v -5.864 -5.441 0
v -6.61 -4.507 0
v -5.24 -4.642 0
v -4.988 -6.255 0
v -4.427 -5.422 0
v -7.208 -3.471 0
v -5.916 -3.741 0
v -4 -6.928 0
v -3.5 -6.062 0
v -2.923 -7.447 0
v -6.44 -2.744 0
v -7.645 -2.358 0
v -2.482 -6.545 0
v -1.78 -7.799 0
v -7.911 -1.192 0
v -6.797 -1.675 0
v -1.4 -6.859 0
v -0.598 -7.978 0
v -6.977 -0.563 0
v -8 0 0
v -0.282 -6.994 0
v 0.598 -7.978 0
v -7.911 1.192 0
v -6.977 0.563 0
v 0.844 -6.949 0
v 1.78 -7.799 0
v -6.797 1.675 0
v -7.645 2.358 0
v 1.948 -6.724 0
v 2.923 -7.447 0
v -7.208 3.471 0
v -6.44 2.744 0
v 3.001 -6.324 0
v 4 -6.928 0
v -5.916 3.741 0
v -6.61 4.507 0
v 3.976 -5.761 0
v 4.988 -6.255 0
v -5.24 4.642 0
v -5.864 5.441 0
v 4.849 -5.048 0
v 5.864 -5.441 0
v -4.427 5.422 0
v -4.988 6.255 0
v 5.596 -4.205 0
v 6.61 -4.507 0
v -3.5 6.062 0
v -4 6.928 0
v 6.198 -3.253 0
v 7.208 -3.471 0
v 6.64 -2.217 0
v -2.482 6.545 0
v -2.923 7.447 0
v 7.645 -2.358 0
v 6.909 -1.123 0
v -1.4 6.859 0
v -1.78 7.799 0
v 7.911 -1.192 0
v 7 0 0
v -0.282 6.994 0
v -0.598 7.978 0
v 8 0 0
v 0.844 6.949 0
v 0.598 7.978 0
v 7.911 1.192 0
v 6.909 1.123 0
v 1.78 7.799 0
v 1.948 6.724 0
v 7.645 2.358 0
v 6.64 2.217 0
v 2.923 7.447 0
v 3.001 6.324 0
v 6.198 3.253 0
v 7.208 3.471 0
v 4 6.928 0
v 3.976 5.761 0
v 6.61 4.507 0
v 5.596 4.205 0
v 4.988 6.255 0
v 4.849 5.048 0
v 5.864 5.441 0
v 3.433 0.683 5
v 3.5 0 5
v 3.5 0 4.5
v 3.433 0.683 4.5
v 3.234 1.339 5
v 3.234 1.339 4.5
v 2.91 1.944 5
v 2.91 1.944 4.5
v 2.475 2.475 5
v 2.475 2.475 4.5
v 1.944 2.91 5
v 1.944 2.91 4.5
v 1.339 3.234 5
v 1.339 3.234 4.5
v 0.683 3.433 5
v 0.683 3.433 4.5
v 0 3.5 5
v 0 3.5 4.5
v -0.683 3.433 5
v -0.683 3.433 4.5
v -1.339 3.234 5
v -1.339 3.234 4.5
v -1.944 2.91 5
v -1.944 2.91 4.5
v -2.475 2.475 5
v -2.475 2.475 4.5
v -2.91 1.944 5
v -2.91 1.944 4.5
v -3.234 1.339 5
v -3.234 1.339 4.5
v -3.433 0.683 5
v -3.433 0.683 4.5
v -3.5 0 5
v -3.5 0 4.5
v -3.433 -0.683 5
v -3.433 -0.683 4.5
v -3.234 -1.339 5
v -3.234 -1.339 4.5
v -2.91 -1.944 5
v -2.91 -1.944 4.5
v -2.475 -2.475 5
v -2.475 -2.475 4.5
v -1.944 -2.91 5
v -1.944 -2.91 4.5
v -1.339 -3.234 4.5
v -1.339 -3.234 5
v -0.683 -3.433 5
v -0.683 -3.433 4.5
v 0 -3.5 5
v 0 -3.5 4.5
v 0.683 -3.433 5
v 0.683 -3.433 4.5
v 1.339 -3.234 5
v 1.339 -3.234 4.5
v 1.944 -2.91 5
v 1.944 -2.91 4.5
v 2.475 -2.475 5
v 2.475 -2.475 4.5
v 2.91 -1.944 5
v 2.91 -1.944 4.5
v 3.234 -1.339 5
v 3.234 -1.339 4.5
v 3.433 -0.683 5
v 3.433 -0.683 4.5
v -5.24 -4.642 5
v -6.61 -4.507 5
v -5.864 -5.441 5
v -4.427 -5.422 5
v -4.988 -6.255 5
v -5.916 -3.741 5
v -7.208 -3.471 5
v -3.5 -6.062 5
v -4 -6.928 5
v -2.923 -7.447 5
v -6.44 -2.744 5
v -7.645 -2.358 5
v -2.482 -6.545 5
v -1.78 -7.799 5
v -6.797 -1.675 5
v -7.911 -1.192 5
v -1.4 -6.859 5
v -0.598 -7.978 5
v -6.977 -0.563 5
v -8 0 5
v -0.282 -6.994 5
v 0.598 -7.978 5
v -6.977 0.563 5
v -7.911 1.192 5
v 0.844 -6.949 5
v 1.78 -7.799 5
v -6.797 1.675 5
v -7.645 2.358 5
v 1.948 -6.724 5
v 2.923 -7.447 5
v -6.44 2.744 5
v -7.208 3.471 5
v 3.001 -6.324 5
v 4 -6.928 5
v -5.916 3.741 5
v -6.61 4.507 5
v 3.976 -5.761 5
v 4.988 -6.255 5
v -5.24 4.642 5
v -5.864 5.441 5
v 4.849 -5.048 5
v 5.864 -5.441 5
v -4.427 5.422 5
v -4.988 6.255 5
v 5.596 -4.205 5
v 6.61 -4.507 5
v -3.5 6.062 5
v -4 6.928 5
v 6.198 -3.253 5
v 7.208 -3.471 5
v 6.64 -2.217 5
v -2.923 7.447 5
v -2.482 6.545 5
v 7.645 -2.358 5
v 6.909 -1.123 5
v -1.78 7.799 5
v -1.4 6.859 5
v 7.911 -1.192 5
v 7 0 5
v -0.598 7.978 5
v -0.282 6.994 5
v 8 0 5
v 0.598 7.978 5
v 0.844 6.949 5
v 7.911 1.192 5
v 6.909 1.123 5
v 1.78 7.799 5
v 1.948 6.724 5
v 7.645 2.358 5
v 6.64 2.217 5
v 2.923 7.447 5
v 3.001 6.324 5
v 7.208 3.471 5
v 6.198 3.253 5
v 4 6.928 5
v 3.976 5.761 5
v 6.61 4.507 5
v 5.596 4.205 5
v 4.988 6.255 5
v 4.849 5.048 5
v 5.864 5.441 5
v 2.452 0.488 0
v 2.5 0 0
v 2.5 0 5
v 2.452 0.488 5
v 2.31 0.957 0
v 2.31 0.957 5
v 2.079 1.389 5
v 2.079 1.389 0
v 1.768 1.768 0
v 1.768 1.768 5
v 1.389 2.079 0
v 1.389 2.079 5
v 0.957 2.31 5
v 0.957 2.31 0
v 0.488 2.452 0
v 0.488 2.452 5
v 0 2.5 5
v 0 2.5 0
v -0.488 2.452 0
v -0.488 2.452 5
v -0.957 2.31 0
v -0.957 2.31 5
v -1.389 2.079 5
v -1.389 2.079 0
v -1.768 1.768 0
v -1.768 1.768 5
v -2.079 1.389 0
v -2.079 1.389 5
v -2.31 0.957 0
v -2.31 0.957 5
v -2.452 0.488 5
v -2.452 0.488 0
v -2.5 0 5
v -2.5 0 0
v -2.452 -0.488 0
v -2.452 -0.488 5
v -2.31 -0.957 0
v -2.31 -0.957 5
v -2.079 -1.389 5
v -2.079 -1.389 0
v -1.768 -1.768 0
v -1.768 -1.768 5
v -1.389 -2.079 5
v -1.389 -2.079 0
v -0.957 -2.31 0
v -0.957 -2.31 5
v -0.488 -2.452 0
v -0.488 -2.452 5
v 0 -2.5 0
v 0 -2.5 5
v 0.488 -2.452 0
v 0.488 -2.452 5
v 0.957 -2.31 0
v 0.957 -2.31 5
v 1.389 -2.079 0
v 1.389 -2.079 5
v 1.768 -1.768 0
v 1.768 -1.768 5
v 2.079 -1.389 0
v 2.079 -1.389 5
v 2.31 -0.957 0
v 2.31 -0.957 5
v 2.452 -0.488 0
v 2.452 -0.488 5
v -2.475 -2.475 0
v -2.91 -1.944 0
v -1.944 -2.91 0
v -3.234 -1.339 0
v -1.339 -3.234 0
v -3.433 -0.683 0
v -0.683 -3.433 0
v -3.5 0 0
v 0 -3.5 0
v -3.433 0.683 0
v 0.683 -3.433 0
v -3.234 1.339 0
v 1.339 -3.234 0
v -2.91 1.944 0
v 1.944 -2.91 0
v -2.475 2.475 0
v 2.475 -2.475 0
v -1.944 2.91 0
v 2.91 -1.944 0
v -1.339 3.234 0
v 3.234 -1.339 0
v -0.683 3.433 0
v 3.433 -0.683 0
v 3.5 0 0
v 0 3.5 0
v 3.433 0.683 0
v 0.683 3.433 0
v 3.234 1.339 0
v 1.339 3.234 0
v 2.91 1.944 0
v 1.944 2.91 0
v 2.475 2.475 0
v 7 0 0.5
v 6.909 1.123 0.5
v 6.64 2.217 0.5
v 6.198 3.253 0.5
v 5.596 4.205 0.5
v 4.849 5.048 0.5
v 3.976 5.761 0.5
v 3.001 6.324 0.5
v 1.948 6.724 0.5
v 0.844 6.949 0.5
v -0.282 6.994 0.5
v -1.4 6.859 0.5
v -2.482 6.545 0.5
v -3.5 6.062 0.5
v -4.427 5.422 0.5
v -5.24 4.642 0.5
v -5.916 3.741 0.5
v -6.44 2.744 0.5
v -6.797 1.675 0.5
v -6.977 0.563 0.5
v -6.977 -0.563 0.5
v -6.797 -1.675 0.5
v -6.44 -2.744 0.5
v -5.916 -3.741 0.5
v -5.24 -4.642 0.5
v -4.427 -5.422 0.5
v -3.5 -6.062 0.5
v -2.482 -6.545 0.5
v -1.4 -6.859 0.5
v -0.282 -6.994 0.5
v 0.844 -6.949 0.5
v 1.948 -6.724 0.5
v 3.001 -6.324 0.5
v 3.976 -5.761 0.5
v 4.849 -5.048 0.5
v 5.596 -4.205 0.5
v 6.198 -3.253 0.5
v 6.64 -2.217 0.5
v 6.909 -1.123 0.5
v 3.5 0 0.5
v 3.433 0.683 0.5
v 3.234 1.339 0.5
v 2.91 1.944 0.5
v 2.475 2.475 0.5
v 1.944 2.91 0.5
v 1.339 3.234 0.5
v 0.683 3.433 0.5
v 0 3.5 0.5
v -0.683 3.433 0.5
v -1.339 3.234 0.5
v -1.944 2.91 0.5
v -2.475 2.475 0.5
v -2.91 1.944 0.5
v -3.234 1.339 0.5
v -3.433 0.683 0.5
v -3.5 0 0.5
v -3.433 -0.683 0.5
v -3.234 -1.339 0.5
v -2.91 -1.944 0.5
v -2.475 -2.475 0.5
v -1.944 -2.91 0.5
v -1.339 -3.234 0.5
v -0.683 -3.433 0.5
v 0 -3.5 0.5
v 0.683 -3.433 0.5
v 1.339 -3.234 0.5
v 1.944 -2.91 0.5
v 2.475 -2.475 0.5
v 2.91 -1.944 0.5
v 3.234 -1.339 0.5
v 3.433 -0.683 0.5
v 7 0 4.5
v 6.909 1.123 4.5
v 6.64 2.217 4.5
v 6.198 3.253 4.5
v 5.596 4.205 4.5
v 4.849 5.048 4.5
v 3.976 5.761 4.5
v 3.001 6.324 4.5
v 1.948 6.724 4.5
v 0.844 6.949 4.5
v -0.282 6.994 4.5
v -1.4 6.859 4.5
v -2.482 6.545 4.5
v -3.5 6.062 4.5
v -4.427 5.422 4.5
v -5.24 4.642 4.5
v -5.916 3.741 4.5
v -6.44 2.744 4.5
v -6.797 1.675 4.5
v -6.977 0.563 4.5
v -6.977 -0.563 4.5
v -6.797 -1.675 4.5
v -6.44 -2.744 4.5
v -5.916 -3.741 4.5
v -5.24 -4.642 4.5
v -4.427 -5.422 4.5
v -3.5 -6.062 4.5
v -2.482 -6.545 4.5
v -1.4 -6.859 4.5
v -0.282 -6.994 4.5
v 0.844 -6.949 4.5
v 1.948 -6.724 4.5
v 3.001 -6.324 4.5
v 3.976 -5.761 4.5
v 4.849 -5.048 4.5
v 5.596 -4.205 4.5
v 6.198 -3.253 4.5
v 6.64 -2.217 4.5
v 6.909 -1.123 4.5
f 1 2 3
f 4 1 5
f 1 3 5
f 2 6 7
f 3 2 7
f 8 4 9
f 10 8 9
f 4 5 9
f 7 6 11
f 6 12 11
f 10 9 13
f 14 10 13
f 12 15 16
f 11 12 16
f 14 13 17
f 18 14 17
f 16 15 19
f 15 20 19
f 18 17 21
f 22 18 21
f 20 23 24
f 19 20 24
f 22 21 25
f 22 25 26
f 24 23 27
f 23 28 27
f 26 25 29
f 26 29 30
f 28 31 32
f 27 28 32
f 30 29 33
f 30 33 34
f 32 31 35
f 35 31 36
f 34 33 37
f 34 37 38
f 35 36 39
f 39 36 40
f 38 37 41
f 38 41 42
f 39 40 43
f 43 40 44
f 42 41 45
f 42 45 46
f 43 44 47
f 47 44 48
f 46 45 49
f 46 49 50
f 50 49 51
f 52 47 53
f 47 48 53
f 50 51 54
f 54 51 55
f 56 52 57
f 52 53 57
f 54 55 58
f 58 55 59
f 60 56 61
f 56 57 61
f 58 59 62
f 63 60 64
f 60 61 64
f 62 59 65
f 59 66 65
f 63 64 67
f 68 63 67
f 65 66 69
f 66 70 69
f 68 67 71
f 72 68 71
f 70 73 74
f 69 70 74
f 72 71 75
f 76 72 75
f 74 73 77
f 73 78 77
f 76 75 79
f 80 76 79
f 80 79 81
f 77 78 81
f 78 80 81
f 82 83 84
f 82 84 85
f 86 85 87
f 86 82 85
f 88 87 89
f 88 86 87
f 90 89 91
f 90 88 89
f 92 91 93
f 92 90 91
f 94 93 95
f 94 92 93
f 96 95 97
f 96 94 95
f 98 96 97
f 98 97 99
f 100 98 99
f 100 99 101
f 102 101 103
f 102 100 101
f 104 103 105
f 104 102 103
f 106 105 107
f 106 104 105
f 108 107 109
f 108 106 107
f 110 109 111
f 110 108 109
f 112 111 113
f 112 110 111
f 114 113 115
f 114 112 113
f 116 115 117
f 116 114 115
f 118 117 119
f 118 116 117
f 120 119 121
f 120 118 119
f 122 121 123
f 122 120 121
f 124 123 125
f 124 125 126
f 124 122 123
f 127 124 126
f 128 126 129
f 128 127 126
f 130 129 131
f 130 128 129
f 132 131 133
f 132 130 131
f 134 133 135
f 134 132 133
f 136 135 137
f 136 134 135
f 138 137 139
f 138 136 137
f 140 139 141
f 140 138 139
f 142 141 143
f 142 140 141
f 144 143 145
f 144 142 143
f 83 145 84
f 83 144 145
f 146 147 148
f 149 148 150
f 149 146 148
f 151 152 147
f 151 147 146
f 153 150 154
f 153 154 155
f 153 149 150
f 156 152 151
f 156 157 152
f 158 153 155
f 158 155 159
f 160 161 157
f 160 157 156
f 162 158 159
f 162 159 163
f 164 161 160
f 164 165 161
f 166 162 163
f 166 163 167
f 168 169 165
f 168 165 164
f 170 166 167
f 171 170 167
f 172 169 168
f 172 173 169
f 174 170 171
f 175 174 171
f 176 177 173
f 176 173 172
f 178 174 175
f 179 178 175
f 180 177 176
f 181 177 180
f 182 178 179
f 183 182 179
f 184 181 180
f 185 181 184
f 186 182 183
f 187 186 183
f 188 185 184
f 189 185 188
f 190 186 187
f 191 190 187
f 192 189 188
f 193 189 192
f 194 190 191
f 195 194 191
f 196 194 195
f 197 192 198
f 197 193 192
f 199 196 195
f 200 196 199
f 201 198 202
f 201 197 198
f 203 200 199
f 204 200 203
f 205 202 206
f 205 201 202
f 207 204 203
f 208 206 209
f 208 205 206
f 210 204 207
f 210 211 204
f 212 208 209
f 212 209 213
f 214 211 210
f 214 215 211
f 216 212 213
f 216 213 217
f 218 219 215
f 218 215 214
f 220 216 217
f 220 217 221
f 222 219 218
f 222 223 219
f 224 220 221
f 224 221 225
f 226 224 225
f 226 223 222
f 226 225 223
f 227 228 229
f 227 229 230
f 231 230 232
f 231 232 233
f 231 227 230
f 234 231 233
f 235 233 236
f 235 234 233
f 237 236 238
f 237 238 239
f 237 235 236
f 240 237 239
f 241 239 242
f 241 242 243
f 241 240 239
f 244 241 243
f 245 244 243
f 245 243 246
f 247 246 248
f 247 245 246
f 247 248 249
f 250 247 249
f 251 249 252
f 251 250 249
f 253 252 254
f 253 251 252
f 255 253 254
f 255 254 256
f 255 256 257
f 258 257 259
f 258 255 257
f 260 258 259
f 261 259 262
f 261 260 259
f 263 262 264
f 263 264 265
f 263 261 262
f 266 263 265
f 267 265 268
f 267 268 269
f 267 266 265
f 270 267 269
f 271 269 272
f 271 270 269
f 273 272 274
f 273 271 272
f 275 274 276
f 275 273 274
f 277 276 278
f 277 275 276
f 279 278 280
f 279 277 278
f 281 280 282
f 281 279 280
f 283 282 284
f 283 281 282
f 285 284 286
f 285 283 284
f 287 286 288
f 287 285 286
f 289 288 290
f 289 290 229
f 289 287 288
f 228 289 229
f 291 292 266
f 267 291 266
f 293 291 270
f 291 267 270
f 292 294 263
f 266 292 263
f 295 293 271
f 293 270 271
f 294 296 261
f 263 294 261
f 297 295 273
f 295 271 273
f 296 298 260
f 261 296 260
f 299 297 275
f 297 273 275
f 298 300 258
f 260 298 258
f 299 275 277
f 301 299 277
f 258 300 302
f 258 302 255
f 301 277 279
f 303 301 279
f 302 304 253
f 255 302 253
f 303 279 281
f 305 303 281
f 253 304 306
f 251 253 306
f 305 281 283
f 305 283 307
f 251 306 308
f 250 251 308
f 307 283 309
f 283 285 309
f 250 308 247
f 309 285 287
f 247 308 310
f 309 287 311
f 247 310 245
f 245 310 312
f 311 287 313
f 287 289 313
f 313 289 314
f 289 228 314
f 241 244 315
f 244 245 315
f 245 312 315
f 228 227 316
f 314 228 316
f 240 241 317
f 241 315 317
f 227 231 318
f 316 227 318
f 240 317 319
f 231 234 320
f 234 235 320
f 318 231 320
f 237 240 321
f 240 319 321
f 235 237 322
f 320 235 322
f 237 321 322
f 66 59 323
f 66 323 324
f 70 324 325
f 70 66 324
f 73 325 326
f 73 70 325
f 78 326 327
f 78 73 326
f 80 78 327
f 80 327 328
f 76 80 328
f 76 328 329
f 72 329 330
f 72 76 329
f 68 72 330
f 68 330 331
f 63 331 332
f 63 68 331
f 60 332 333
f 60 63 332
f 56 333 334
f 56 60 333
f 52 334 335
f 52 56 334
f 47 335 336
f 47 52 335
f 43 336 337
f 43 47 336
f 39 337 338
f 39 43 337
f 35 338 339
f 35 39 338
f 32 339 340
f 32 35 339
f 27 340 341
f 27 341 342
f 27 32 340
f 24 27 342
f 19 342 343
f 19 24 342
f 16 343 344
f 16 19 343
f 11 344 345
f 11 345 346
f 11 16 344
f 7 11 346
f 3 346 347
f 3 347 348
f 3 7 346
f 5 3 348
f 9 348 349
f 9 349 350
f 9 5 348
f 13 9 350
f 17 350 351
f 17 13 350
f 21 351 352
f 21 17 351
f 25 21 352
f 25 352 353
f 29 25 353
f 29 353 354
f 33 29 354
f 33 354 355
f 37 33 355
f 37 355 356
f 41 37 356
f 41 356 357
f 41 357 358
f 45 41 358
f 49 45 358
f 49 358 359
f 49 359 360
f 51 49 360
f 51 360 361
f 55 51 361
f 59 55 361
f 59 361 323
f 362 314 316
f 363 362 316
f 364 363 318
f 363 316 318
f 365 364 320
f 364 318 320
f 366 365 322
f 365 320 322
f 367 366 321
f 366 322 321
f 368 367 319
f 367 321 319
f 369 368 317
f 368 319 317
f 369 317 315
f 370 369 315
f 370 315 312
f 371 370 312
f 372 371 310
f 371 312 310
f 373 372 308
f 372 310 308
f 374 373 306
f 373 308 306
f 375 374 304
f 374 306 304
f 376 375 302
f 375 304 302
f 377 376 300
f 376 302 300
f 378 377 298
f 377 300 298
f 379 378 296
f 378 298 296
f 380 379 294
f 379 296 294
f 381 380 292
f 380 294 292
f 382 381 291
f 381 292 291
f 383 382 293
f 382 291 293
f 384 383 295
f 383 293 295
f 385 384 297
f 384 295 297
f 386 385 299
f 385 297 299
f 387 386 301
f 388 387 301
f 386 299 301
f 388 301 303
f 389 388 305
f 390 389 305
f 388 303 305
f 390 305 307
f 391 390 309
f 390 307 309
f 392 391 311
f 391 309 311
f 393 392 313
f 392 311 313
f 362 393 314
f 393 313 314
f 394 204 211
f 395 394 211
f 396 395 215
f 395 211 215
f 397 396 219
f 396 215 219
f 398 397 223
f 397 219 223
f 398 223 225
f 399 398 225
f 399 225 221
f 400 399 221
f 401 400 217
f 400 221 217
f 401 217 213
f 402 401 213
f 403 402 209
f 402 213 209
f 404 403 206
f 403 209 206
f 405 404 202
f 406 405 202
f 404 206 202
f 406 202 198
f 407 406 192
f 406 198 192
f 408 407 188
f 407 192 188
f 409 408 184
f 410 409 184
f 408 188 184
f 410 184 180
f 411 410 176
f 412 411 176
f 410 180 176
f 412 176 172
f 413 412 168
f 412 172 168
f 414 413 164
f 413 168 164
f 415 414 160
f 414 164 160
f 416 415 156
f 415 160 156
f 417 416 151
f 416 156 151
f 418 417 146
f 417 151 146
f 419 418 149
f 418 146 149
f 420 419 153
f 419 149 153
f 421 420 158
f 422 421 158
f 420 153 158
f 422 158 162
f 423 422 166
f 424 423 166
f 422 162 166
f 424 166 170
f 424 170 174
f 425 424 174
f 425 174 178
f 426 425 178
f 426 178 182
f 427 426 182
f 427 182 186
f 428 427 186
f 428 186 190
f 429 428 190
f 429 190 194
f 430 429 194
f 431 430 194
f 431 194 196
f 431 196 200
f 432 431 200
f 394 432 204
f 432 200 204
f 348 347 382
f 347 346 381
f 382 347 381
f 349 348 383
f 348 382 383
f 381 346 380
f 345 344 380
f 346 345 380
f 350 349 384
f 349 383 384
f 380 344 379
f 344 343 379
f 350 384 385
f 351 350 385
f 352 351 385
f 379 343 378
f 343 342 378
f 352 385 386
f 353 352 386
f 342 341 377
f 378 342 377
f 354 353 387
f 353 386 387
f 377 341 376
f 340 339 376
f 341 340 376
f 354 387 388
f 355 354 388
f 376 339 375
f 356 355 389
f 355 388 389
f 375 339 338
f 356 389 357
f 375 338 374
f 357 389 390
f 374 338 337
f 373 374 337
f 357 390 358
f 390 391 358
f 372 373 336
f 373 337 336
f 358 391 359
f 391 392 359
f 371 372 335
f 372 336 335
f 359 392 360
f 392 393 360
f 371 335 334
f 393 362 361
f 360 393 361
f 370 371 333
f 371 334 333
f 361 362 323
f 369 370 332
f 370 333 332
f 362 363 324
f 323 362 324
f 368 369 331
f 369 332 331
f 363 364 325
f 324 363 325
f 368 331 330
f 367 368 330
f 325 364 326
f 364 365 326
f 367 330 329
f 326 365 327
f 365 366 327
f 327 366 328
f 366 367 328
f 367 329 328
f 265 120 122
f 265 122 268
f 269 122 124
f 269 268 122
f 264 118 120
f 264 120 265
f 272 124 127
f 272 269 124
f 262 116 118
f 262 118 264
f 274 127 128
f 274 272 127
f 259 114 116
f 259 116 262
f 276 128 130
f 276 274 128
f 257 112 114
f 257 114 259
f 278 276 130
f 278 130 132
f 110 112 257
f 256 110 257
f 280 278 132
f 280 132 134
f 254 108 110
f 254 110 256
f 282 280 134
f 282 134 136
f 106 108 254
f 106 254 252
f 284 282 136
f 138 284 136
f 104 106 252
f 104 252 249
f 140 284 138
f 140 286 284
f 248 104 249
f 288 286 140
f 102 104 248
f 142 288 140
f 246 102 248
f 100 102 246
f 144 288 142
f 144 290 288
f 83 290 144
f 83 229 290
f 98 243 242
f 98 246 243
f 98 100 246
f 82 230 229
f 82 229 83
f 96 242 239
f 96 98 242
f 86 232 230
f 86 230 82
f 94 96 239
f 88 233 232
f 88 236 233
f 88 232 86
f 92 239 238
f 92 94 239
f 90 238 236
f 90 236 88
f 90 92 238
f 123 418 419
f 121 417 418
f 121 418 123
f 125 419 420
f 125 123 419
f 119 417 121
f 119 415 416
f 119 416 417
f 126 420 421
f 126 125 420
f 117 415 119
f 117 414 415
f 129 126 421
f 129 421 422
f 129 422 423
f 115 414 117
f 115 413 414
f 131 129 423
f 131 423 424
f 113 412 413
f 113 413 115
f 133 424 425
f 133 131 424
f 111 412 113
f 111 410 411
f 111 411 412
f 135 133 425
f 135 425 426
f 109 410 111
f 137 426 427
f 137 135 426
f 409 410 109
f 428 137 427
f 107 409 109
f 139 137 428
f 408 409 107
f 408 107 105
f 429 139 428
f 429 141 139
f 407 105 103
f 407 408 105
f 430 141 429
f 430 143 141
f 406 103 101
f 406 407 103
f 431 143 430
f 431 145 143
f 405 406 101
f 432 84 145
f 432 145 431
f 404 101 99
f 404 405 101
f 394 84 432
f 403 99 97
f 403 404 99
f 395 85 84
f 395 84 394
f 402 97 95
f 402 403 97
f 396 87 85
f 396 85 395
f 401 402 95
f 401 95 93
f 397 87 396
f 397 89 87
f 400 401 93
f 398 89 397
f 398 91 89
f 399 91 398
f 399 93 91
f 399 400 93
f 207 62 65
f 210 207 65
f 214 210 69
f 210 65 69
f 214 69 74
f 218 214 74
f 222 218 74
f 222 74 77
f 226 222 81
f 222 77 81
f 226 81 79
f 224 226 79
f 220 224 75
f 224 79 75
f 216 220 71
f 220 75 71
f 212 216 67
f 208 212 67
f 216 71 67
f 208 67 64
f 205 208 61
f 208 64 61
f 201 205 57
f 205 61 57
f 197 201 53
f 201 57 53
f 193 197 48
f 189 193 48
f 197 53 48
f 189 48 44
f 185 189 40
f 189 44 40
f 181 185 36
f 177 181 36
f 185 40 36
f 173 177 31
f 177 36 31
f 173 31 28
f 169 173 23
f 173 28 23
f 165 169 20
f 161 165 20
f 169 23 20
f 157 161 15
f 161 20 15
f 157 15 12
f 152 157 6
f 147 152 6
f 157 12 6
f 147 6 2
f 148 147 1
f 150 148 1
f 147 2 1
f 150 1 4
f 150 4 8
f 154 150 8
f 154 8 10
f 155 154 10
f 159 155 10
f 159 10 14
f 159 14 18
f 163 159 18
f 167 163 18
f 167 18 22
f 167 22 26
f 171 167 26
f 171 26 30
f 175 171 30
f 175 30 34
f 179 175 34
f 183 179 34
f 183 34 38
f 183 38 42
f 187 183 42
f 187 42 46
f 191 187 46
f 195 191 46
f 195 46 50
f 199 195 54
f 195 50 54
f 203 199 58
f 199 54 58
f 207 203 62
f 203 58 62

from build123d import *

# Parameters (mm, degrees)
SKETCH019_R     = 8
SKETCH019_R_2   = 2.5
PAD010_DEPTH    = 5
SKETCH020_R     = 7
SKETCH020_R_2   = 3.5
POCKET010_DEPTH = 0.5
SKETCH021_R     = 7
SKETCH021_R_2   = 3.5
POCKET011_DEPTH = 0.5


with BuildPart() as part:
    # Sketch019 → Pad010 (new body)
    with BuildSketch(Plane.XY):
        Circle(SKETCH019_R)
        Circle(SKETCH019_R_2, mode=Mode.SUBTRACT)
    extrude(amount=PAD010_DEPTH)

    # Sketch020 → Pocket010 (cut)
    with BuildSketch(Plane.XY.offset(5)):
        Circle(SKETCH020_R)
        Circle(SKETCH020_R_2, mode=Mode.SUBTRACT)
    extrude(amount=-POCKET010_DEPTH, mode=Mode.SUBTRACT)

    # Sketch021 → Pocket011 (cut)
    with BuildSketch(Plane.XY):
        Circle(SKETCH021_R)
        Circle(SKETCH021_R_2, mode=Mode.SUBTRACT)
    extrude(amount=POCKET011_DEPTH, mode=Mode.SUBTRACT)


solid = part.part
